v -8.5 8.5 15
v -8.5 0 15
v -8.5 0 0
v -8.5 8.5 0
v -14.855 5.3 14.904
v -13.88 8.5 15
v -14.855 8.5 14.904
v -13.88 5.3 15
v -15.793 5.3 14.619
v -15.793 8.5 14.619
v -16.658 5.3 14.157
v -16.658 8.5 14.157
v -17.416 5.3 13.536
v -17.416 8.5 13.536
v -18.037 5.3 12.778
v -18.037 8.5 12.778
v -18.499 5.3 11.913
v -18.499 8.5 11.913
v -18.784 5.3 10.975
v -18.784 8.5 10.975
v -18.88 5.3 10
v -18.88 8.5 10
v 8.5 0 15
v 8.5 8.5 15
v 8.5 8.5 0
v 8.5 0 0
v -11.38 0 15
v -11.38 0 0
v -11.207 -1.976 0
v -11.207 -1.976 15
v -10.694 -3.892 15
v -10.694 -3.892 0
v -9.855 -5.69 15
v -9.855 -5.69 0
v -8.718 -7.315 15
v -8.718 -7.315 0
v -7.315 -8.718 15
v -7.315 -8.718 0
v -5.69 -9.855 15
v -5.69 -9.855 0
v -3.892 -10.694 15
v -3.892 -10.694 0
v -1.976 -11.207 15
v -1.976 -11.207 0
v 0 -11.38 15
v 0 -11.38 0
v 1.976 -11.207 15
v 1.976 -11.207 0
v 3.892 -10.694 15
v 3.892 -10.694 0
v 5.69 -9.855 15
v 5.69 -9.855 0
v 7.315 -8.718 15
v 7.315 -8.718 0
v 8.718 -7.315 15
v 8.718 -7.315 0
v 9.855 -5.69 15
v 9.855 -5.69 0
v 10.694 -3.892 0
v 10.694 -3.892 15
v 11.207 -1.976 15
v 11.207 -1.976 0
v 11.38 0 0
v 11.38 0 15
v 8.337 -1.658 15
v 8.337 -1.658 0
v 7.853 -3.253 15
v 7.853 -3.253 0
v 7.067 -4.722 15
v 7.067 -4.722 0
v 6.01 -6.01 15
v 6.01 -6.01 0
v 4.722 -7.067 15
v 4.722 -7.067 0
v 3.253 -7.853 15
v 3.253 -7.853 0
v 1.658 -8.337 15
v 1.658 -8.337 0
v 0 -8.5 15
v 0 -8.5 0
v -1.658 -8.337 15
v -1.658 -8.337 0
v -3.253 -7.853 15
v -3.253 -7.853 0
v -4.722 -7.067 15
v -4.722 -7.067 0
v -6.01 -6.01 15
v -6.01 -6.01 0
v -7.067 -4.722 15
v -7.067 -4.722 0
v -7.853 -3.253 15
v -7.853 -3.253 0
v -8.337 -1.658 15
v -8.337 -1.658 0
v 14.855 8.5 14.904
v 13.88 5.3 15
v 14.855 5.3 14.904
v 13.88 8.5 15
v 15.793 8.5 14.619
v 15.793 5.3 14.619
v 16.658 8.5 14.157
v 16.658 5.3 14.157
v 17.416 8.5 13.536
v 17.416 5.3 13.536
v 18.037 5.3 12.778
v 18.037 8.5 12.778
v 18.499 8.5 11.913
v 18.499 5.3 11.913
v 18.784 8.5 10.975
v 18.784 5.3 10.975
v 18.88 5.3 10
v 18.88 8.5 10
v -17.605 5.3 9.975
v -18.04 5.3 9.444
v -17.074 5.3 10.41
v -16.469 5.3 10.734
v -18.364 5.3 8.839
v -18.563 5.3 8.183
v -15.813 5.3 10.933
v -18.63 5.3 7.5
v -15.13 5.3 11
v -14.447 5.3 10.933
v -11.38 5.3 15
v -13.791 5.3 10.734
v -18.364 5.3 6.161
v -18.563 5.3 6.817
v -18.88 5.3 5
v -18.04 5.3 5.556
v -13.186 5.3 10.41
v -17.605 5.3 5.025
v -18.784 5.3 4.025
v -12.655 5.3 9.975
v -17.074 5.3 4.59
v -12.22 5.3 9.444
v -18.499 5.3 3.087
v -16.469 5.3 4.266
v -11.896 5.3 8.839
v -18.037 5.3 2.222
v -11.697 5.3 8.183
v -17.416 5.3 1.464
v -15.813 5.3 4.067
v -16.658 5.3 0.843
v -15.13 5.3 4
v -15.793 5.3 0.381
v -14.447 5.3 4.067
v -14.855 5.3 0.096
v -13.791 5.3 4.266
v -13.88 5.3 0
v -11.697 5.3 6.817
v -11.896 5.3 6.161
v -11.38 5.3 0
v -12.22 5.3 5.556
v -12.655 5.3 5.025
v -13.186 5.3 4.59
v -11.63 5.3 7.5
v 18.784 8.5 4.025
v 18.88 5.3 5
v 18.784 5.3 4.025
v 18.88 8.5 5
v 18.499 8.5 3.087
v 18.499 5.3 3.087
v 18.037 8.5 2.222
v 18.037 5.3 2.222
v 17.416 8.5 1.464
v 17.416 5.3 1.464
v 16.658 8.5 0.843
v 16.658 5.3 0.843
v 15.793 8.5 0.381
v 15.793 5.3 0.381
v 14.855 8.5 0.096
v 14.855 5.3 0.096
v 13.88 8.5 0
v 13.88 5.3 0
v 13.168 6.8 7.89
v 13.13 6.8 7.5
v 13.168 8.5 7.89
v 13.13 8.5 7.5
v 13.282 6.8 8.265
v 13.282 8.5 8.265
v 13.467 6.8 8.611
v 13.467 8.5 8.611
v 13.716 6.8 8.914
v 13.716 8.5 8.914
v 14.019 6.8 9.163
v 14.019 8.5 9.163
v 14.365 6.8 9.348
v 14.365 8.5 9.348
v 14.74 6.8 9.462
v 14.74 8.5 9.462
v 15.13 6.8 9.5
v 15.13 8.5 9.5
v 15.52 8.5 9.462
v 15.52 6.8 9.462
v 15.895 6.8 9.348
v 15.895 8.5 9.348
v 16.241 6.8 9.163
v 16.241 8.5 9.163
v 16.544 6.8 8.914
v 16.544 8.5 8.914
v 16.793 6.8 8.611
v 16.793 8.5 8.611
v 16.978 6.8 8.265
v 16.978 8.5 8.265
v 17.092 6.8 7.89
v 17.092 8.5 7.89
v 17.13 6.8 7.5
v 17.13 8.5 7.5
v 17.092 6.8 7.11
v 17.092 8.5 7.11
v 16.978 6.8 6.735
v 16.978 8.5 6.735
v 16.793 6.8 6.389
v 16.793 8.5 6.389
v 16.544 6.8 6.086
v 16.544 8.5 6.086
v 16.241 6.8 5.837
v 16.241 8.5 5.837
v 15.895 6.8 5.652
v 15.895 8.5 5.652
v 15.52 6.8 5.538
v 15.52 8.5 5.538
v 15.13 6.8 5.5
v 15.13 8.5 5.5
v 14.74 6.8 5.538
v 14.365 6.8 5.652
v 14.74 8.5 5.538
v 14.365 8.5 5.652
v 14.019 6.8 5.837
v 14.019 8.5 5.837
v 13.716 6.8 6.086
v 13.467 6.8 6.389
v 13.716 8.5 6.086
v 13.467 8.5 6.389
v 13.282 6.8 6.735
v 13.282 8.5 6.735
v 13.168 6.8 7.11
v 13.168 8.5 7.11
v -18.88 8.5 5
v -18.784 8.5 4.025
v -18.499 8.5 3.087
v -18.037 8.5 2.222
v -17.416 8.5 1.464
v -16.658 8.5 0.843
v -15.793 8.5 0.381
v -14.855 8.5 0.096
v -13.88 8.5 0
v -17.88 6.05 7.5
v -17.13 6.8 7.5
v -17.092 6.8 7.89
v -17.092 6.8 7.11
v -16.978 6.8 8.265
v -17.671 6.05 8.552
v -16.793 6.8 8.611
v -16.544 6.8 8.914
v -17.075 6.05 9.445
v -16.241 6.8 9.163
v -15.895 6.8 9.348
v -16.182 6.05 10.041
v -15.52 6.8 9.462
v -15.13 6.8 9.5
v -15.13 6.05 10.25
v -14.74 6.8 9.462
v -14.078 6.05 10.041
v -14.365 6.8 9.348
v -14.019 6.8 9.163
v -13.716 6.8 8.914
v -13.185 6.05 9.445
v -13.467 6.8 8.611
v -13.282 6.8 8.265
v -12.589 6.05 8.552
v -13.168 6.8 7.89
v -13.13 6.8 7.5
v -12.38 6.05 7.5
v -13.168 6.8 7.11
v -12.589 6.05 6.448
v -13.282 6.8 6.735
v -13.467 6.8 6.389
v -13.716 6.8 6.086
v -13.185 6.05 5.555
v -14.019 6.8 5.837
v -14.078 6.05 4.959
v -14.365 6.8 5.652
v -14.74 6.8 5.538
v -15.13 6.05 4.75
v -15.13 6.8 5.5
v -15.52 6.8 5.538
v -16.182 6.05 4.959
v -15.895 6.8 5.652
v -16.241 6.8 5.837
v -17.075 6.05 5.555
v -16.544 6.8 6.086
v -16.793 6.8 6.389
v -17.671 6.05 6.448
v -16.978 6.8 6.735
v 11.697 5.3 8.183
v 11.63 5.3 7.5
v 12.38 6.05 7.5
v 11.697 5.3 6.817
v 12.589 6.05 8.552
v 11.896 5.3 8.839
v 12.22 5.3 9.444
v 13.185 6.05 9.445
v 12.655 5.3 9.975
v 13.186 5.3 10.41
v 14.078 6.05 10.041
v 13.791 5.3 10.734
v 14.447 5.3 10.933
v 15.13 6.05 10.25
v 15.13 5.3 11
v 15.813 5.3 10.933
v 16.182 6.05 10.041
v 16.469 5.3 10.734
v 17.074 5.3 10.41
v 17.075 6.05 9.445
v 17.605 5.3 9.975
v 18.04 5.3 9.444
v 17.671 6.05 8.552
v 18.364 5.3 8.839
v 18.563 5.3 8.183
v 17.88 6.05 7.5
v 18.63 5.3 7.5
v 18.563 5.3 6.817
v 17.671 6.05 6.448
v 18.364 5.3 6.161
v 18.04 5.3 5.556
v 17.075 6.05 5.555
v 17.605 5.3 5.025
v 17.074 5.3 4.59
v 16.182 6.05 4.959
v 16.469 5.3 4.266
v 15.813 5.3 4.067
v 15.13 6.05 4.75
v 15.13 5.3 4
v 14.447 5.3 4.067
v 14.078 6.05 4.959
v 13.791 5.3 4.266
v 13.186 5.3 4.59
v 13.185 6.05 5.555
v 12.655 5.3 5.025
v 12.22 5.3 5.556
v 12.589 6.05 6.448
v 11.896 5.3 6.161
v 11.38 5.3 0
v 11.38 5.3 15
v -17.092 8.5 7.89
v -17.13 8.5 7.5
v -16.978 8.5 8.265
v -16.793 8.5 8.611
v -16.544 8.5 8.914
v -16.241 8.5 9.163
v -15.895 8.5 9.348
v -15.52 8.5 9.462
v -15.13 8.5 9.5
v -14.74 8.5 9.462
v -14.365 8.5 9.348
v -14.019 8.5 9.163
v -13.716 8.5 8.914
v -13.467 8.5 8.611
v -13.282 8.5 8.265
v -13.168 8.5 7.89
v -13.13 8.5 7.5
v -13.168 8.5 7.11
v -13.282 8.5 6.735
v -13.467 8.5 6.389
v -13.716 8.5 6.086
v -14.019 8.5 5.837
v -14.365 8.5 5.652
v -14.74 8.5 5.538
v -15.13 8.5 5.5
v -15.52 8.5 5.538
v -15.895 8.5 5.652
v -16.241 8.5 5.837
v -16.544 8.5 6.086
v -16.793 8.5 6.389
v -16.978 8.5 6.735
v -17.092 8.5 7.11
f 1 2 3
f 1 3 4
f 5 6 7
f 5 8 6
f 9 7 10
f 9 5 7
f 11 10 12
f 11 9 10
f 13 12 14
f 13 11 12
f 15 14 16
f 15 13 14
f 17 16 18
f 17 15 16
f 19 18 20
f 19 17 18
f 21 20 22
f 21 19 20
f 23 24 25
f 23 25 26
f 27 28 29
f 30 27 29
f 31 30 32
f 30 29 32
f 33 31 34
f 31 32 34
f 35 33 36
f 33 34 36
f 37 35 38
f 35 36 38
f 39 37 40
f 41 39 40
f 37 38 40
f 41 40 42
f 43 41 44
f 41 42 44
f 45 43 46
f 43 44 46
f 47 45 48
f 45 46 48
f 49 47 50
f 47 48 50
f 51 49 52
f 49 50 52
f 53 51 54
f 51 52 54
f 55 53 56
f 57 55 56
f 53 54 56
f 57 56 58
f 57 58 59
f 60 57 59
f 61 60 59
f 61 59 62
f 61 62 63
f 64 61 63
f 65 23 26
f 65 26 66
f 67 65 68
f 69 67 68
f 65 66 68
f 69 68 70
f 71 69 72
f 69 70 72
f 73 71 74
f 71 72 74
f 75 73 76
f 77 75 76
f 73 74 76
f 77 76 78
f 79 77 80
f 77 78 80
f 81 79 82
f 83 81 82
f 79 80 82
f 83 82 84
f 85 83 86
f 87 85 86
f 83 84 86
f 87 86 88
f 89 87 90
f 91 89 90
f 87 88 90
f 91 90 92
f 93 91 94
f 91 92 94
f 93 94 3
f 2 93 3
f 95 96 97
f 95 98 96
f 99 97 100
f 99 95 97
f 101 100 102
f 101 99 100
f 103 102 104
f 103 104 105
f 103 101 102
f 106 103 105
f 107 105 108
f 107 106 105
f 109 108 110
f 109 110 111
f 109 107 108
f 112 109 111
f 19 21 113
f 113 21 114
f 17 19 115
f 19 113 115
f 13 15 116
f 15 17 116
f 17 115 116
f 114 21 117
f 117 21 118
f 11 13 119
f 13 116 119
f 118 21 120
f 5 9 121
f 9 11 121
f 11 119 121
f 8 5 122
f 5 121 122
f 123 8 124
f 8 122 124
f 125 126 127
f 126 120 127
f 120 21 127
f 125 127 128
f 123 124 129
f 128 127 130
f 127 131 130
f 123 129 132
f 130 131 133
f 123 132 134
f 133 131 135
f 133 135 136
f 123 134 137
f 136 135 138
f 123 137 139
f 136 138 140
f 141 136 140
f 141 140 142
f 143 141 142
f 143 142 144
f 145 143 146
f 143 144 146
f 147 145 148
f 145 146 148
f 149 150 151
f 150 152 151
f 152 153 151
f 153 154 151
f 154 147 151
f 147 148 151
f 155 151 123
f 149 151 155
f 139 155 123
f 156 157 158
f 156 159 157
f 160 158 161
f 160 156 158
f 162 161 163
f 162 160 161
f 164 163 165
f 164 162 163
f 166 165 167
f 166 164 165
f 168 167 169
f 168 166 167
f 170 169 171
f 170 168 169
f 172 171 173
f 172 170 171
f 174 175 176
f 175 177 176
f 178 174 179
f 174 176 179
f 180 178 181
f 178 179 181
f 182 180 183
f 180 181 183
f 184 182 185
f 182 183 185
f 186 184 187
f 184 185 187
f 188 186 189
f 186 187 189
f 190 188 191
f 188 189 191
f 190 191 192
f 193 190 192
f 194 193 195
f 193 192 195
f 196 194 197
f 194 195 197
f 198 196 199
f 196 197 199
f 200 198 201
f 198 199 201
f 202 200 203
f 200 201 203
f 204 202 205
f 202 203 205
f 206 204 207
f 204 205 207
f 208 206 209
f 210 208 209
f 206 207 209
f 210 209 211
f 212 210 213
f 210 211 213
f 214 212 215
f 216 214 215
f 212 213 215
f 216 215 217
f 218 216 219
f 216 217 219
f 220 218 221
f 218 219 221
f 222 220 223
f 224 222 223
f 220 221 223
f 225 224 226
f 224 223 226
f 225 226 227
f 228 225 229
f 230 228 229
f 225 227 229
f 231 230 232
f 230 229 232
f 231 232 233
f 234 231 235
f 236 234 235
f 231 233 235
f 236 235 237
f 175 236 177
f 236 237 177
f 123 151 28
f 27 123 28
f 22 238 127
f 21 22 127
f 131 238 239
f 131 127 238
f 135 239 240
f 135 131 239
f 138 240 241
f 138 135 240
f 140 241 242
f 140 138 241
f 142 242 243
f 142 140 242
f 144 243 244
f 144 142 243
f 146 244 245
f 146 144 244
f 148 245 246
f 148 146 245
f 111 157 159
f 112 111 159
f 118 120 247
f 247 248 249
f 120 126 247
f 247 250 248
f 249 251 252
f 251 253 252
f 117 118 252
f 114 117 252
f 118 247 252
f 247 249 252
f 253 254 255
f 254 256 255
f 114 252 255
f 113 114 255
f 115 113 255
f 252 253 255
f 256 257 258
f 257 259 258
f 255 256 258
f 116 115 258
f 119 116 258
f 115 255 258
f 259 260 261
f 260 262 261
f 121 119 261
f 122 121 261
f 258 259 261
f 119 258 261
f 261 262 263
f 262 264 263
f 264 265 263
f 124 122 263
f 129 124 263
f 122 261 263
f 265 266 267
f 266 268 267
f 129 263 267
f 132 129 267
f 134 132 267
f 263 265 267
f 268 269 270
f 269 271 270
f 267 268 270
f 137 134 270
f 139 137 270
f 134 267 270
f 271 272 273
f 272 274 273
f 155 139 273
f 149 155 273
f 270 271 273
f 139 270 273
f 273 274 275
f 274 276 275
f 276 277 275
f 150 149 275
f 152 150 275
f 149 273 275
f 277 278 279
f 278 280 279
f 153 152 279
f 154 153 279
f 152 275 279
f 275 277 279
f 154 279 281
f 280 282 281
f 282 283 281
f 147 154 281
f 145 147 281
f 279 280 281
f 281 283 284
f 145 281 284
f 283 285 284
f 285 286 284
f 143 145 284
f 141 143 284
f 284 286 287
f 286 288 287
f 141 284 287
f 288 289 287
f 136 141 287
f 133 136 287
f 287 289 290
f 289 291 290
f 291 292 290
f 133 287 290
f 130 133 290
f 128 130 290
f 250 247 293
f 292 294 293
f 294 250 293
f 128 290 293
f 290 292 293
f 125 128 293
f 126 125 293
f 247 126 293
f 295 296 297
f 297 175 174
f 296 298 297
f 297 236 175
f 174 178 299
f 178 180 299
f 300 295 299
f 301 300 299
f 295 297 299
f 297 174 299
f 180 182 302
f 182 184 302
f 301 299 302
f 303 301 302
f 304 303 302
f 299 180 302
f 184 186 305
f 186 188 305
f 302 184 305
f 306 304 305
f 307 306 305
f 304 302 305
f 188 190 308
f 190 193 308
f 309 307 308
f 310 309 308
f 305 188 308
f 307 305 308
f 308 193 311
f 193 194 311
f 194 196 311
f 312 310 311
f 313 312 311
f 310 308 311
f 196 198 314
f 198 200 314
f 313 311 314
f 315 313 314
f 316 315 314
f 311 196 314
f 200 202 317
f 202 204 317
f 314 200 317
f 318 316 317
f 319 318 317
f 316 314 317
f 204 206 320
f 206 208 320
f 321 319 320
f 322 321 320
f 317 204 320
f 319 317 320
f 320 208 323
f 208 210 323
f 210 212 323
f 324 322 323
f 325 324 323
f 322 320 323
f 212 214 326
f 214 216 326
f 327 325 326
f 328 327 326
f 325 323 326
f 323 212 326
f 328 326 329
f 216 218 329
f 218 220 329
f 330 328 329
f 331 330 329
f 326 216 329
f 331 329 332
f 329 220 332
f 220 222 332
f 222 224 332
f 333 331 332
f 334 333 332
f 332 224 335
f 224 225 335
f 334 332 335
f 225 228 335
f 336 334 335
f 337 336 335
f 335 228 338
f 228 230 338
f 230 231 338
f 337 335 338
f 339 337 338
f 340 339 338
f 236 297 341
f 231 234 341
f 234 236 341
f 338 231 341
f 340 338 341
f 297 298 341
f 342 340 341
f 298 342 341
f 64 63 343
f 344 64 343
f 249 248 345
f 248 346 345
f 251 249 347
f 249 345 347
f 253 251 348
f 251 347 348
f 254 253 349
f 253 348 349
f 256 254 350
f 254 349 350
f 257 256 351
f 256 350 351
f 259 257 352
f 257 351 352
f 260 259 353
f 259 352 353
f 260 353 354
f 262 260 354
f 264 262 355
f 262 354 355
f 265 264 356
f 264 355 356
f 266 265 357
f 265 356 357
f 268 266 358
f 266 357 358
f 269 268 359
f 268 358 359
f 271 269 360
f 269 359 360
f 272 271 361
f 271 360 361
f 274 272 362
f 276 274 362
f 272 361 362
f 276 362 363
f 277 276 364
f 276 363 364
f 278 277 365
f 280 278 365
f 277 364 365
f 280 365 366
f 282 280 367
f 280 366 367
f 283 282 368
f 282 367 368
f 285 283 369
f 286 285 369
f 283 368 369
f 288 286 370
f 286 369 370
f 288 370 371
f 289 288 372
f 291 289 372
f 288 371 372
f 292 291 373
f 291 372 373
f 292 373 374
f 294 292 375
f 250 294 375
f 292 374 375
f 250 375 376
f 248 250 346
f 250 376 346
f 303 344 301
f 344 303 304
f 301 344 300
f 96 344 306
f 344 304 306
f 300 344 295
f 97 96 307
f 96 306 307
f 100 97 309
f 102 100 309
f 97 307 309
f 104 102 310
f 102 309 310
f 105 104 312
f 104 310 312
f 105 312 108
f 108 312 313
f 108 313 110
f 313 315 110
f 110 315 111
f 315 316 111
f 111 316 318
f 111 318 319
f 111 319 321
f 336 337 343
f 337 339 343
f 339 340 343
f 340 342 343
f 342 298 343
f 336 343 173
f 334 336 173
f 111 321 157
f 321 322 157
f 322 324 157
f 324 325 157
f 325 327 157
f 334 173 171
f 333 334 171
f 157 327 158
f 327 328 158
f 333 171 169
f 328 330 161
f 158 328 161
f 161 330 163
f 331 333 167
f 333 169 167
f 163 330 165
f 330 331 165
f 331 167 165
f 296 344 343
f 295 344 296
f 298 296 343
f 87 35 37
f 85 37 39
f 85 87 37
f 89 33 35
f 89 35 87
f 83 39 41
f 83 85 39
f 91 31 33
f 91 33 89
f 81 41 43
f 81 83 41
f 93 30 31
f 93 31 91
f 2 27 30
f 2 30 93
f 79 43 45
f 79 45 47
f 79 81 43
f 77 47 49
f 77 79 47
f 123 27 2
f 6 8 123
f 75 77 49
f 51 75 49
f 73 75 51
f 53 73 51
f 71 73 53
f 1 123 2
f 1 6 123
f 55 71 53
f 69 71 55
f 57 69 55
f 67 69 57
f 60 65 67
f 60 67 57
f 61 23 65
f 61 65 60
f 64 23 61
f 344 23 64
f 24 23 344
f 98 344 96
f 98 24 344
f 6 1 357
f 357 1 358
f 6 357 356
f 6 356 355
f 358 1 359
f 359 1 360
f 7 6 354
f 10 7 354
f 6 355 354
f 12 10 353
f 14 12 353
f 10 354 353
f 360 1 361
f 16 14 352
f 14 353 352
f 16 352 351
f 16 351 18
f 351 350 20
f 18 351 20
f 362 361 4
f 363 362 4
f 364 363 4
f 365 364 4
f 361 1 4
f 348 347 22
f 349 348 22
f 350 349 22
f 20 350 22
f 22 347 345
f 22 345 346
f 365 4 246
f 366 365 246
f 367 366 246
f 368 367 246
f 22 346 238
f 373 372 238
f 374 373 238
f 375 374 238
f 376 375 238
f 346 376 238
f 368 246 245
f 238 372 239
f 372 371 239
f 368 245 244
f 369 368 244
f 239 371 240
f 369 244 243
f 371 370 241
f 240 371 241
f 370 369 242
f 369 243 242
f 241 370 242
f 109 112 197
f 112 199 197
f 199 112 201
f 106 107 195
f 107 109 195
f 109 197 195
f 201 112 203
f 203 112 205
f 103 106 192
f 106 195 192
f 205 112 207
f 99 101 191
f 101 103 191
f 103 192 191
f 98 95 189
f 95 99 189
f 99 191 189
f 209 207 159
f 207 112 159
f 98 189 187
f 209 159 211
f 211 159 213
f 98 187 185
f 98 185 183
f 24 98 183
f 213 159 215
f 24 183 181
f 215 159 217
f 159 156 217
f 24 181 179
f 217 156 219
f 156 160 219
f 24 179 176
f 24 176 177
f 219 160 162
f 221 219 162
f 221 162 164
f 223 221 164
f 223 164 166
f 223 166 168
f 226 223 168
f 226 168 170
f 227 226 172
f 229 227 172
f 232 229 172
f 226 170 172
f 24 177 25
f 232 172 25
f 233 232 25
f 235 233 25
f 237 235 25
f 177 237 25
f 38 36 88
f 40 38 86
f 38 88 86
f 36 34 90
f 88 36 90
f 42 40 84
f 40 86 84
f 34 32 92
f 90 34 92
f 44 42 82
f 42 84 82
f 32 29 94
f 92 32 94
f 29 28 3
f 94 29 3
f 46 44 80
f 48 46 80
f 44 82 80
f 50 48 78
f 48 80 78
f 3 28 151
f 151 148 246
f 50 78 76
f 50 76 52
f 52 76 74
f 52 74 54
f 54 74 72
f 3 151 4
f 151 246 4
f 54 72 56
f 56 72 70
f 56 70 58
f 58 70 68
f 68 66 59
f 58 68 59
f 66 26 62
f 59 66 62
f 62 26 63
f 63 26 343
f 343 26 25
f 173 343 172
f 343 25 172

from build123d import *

# Parameters (mm, degrees)
F1_DEPTH       = 15
F3_D           = 4
F3_CSINK_D     = 7
F3_CSINK_ANGLE = 90
F4_R           = 5


with BuildPart() as f1:
    # F0 (on Top) → F1 (new body)
    with BuildSketch(Plane.XY):
        with BuildLine():
            ThreePointArc((-10.0704716871, 5.3), (-9.3541459143, 6.4810766246), (-8.5, 7.5666637298))
            Line((-8.5, 7.5666637298), (-8.5, 8.5))
            Line((-8.5, 8.5), (-18.88, 8.5))
            Line((-18.88, 8.5), (-18.88, 5.3))
            Line((-18.88, 5.3), (-11.38, 5.3))
            Line((-11.38, 5.3), (-10.0704716871, 5.3))
        make_face()
        with BuildLine():
            ThreePointArc((-11.38, 0), (-11.0477682769, 2.7296915761), (-10.0704716871, 5.3))
            Line((-10.0704716871, 5.3), (-11.38, 5.3))
            Line((-11.38, 5.3), (-11.38, 0))
        make_face()
        with BuildLine():
            ThreePointArc((8.5, 0), (0, -8.5), (-8.5, 0))
            Line((-8.5, 0), (-8.5, 5.3))
            Line((-8.5, 5.3), (-10.0704716871, 5.3))
            ThreePointArc((-10.0704716871, 5.3), (-11.0477682769, 2.7296915761), (-11.38, 0))
            ThreePointArc((-11.38, 0), (0, -11.38), (11.38, 0))
            ThreePointArc((11.38, 0), (11.0477682769, 2.7296915761), (10.0704716871, 5.3))
            Line((10.0704716871, 5.3), (8.5, 5.3))
            Line((8.5, 5.3), (8.5, 0))
        make_face()
        with BuildLine():
            Line((11.38, 5.3), (10.0704716871, 5.3))
            ThreePointArc((10.0704716871, 5.3), (11.0477682769, 2.7296915761), (11.38, 0))
            Line((11.38, 0), (11.38, 5.3))
        make_face()
        with BuildLine():
            Line((8.5, 8.5), (8.5, 7.5666637298))
            ThreePointArc((8.5, 7.5666637298), (9.3541459143, 6.4810766246), (10.0704716871, 5.3))
            Line((10.0704716871, 5.3), (11.38, 5.3))
            Line((11.38, 5.3), (18.88, 5.3))
            Line((18.88, 5.3), (18.88, 8.5))
            Line((18.88, 8.5), (8.5, 8.5))
        make_face()
        with BuildLine():
            Line((-10.0704716871, 5.3), (-8.5, 5.3))
            Line((-8.5, 5.3), (-8.5, 7.5666637298))
            ThreePointArc((-8.5, 7.5666637298), (-9.3541459143, 6.4810766246), (-10.0704716871, 5.3))
        make_face()
        with BuildLine():
            Line((8.5, 7.5666637298), (8.5, 5.3))
            Line((8.5, 5.3), (10.0704716871, 5.3))
            ThreePointArc((10.0704716871, 5.3), (9.3541459143, 6.4810766246), (8.5, 7.5666637298))
        make_face()
    extrude(amount=F1_DEPTH)

    # F3 (through all)
    with Locations(Plane.XZ.offset(-5.3)):
        with Locations((-15.13, 7.5), (15.13, 7.5)):
            CounterSinkHole(F3_D / 2, F3_CSINK_D / 2, counter_sink_angle=F3_CSINK_ANGLE)

    # F4
    f4_edges = [f1.edges().sort_by_distance(p)[0] for p in [
        (-18.88, 6.9, 15),
        (-18.88, 6.9, 0),
        (18.88, 6.9, 15),
        (18.88, 6.9, 0),
    ]]
    fillet(f4_edges, radius=F4_R)


solid = f1.part
